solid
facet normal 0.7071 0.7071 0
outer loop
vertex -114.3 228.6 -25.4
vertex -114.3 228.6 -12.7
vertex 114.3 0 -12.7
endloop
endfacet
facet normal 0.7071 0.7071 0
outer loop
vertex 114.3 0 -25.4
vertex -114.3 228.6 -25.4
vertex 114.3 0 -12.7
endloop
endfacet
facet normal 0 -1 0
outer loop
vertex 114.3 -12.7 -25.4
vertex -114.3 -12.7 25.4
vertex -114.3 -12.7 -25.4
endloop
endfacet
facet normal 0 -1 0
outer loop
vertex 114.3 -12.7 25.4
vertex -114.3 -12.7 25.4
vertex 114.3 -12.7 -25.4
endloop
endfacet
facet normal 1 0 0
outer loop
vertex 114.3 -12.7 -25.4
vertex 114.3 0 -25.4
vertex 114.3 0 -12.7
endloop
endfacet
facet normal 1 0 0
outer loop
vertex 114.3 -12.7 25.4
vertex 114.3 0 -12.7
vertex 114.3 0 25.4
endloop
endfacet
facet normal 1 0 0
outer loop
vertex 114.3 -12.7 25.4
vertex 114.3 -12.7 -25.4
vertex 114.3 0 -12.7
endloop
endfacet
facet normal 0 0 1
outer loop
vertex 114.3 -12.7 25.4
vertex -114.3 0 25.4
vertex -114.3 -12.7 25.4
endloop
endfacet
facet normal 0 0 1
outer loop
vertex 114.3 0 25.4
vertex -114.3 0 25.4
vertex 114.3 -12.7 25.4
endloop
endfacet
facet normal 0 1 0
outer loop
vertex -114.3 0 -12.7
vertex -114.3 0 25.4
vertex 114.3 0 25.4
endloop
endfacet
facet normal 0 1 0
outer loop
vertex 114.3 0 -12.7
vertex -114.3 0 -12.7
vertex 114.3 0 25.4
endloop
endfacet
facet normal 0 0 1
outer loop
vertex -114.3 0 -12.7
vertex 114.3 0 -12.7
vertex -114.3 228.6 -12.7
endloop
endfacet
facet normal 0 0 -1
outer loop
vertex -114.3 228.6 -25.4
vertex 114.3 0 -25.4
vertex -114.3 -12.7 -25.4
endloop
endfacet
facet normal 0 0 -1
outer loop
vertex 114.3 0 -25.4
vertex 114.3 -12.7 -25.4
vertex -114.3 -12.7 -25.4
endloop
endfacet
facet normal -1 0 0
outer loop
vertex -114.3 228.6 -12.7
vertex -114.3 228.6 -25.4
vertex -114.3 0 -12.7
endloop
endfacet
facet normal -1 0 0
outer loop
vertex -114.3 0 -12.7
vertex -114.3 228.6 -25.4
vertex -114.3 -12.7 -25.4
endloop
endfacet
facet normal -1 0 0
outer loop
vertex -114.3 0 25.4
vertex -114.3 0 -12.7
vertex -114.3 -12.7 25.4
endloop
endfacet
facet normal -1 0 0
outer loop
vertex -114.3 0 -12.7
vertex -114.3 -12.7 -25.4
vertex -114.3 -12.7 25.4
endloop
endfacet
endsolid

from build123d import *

# Parameters (mm, degrees)
F0_W     = 228.6
F0_H     = 50.8
F1_DEPTH = 12.7
F2_W     = 228.6
F2_H     = 12.7
F3_DEPTH = 228.6
F5_DEPTH = 25.4


with BuildPart() as f1:
    # F0 (on Front) → F1 (new body)
    with BuildSketch(Plane.XZ):
        Rectangle(F0_W, F0_H)
    extrude(amount=F1_DEPTH)

    # F2 (on face) → F3 (join)
    with BuildSketch(Plane(origin=(0, 0, 0), x_dir=(-1, 0, 0), z_dir=(0, 1, 0))):
        with Locations((0, -19.05)):
            Rectangle(F2_W, F2_H)
    extrude(amount=F3_DEPTH)

    # F4 (on face) → F5 (cut)
    with BuildSketch(Plane.XY.offset(-12.7)):
        Polygon((114.3, 228.6), (-114.3, 228.6), (114.3, 0), align=None)
    extrude(amount=-F5_DEPTH, mode=Mode.SUBTRACT)


solid = f1.part
